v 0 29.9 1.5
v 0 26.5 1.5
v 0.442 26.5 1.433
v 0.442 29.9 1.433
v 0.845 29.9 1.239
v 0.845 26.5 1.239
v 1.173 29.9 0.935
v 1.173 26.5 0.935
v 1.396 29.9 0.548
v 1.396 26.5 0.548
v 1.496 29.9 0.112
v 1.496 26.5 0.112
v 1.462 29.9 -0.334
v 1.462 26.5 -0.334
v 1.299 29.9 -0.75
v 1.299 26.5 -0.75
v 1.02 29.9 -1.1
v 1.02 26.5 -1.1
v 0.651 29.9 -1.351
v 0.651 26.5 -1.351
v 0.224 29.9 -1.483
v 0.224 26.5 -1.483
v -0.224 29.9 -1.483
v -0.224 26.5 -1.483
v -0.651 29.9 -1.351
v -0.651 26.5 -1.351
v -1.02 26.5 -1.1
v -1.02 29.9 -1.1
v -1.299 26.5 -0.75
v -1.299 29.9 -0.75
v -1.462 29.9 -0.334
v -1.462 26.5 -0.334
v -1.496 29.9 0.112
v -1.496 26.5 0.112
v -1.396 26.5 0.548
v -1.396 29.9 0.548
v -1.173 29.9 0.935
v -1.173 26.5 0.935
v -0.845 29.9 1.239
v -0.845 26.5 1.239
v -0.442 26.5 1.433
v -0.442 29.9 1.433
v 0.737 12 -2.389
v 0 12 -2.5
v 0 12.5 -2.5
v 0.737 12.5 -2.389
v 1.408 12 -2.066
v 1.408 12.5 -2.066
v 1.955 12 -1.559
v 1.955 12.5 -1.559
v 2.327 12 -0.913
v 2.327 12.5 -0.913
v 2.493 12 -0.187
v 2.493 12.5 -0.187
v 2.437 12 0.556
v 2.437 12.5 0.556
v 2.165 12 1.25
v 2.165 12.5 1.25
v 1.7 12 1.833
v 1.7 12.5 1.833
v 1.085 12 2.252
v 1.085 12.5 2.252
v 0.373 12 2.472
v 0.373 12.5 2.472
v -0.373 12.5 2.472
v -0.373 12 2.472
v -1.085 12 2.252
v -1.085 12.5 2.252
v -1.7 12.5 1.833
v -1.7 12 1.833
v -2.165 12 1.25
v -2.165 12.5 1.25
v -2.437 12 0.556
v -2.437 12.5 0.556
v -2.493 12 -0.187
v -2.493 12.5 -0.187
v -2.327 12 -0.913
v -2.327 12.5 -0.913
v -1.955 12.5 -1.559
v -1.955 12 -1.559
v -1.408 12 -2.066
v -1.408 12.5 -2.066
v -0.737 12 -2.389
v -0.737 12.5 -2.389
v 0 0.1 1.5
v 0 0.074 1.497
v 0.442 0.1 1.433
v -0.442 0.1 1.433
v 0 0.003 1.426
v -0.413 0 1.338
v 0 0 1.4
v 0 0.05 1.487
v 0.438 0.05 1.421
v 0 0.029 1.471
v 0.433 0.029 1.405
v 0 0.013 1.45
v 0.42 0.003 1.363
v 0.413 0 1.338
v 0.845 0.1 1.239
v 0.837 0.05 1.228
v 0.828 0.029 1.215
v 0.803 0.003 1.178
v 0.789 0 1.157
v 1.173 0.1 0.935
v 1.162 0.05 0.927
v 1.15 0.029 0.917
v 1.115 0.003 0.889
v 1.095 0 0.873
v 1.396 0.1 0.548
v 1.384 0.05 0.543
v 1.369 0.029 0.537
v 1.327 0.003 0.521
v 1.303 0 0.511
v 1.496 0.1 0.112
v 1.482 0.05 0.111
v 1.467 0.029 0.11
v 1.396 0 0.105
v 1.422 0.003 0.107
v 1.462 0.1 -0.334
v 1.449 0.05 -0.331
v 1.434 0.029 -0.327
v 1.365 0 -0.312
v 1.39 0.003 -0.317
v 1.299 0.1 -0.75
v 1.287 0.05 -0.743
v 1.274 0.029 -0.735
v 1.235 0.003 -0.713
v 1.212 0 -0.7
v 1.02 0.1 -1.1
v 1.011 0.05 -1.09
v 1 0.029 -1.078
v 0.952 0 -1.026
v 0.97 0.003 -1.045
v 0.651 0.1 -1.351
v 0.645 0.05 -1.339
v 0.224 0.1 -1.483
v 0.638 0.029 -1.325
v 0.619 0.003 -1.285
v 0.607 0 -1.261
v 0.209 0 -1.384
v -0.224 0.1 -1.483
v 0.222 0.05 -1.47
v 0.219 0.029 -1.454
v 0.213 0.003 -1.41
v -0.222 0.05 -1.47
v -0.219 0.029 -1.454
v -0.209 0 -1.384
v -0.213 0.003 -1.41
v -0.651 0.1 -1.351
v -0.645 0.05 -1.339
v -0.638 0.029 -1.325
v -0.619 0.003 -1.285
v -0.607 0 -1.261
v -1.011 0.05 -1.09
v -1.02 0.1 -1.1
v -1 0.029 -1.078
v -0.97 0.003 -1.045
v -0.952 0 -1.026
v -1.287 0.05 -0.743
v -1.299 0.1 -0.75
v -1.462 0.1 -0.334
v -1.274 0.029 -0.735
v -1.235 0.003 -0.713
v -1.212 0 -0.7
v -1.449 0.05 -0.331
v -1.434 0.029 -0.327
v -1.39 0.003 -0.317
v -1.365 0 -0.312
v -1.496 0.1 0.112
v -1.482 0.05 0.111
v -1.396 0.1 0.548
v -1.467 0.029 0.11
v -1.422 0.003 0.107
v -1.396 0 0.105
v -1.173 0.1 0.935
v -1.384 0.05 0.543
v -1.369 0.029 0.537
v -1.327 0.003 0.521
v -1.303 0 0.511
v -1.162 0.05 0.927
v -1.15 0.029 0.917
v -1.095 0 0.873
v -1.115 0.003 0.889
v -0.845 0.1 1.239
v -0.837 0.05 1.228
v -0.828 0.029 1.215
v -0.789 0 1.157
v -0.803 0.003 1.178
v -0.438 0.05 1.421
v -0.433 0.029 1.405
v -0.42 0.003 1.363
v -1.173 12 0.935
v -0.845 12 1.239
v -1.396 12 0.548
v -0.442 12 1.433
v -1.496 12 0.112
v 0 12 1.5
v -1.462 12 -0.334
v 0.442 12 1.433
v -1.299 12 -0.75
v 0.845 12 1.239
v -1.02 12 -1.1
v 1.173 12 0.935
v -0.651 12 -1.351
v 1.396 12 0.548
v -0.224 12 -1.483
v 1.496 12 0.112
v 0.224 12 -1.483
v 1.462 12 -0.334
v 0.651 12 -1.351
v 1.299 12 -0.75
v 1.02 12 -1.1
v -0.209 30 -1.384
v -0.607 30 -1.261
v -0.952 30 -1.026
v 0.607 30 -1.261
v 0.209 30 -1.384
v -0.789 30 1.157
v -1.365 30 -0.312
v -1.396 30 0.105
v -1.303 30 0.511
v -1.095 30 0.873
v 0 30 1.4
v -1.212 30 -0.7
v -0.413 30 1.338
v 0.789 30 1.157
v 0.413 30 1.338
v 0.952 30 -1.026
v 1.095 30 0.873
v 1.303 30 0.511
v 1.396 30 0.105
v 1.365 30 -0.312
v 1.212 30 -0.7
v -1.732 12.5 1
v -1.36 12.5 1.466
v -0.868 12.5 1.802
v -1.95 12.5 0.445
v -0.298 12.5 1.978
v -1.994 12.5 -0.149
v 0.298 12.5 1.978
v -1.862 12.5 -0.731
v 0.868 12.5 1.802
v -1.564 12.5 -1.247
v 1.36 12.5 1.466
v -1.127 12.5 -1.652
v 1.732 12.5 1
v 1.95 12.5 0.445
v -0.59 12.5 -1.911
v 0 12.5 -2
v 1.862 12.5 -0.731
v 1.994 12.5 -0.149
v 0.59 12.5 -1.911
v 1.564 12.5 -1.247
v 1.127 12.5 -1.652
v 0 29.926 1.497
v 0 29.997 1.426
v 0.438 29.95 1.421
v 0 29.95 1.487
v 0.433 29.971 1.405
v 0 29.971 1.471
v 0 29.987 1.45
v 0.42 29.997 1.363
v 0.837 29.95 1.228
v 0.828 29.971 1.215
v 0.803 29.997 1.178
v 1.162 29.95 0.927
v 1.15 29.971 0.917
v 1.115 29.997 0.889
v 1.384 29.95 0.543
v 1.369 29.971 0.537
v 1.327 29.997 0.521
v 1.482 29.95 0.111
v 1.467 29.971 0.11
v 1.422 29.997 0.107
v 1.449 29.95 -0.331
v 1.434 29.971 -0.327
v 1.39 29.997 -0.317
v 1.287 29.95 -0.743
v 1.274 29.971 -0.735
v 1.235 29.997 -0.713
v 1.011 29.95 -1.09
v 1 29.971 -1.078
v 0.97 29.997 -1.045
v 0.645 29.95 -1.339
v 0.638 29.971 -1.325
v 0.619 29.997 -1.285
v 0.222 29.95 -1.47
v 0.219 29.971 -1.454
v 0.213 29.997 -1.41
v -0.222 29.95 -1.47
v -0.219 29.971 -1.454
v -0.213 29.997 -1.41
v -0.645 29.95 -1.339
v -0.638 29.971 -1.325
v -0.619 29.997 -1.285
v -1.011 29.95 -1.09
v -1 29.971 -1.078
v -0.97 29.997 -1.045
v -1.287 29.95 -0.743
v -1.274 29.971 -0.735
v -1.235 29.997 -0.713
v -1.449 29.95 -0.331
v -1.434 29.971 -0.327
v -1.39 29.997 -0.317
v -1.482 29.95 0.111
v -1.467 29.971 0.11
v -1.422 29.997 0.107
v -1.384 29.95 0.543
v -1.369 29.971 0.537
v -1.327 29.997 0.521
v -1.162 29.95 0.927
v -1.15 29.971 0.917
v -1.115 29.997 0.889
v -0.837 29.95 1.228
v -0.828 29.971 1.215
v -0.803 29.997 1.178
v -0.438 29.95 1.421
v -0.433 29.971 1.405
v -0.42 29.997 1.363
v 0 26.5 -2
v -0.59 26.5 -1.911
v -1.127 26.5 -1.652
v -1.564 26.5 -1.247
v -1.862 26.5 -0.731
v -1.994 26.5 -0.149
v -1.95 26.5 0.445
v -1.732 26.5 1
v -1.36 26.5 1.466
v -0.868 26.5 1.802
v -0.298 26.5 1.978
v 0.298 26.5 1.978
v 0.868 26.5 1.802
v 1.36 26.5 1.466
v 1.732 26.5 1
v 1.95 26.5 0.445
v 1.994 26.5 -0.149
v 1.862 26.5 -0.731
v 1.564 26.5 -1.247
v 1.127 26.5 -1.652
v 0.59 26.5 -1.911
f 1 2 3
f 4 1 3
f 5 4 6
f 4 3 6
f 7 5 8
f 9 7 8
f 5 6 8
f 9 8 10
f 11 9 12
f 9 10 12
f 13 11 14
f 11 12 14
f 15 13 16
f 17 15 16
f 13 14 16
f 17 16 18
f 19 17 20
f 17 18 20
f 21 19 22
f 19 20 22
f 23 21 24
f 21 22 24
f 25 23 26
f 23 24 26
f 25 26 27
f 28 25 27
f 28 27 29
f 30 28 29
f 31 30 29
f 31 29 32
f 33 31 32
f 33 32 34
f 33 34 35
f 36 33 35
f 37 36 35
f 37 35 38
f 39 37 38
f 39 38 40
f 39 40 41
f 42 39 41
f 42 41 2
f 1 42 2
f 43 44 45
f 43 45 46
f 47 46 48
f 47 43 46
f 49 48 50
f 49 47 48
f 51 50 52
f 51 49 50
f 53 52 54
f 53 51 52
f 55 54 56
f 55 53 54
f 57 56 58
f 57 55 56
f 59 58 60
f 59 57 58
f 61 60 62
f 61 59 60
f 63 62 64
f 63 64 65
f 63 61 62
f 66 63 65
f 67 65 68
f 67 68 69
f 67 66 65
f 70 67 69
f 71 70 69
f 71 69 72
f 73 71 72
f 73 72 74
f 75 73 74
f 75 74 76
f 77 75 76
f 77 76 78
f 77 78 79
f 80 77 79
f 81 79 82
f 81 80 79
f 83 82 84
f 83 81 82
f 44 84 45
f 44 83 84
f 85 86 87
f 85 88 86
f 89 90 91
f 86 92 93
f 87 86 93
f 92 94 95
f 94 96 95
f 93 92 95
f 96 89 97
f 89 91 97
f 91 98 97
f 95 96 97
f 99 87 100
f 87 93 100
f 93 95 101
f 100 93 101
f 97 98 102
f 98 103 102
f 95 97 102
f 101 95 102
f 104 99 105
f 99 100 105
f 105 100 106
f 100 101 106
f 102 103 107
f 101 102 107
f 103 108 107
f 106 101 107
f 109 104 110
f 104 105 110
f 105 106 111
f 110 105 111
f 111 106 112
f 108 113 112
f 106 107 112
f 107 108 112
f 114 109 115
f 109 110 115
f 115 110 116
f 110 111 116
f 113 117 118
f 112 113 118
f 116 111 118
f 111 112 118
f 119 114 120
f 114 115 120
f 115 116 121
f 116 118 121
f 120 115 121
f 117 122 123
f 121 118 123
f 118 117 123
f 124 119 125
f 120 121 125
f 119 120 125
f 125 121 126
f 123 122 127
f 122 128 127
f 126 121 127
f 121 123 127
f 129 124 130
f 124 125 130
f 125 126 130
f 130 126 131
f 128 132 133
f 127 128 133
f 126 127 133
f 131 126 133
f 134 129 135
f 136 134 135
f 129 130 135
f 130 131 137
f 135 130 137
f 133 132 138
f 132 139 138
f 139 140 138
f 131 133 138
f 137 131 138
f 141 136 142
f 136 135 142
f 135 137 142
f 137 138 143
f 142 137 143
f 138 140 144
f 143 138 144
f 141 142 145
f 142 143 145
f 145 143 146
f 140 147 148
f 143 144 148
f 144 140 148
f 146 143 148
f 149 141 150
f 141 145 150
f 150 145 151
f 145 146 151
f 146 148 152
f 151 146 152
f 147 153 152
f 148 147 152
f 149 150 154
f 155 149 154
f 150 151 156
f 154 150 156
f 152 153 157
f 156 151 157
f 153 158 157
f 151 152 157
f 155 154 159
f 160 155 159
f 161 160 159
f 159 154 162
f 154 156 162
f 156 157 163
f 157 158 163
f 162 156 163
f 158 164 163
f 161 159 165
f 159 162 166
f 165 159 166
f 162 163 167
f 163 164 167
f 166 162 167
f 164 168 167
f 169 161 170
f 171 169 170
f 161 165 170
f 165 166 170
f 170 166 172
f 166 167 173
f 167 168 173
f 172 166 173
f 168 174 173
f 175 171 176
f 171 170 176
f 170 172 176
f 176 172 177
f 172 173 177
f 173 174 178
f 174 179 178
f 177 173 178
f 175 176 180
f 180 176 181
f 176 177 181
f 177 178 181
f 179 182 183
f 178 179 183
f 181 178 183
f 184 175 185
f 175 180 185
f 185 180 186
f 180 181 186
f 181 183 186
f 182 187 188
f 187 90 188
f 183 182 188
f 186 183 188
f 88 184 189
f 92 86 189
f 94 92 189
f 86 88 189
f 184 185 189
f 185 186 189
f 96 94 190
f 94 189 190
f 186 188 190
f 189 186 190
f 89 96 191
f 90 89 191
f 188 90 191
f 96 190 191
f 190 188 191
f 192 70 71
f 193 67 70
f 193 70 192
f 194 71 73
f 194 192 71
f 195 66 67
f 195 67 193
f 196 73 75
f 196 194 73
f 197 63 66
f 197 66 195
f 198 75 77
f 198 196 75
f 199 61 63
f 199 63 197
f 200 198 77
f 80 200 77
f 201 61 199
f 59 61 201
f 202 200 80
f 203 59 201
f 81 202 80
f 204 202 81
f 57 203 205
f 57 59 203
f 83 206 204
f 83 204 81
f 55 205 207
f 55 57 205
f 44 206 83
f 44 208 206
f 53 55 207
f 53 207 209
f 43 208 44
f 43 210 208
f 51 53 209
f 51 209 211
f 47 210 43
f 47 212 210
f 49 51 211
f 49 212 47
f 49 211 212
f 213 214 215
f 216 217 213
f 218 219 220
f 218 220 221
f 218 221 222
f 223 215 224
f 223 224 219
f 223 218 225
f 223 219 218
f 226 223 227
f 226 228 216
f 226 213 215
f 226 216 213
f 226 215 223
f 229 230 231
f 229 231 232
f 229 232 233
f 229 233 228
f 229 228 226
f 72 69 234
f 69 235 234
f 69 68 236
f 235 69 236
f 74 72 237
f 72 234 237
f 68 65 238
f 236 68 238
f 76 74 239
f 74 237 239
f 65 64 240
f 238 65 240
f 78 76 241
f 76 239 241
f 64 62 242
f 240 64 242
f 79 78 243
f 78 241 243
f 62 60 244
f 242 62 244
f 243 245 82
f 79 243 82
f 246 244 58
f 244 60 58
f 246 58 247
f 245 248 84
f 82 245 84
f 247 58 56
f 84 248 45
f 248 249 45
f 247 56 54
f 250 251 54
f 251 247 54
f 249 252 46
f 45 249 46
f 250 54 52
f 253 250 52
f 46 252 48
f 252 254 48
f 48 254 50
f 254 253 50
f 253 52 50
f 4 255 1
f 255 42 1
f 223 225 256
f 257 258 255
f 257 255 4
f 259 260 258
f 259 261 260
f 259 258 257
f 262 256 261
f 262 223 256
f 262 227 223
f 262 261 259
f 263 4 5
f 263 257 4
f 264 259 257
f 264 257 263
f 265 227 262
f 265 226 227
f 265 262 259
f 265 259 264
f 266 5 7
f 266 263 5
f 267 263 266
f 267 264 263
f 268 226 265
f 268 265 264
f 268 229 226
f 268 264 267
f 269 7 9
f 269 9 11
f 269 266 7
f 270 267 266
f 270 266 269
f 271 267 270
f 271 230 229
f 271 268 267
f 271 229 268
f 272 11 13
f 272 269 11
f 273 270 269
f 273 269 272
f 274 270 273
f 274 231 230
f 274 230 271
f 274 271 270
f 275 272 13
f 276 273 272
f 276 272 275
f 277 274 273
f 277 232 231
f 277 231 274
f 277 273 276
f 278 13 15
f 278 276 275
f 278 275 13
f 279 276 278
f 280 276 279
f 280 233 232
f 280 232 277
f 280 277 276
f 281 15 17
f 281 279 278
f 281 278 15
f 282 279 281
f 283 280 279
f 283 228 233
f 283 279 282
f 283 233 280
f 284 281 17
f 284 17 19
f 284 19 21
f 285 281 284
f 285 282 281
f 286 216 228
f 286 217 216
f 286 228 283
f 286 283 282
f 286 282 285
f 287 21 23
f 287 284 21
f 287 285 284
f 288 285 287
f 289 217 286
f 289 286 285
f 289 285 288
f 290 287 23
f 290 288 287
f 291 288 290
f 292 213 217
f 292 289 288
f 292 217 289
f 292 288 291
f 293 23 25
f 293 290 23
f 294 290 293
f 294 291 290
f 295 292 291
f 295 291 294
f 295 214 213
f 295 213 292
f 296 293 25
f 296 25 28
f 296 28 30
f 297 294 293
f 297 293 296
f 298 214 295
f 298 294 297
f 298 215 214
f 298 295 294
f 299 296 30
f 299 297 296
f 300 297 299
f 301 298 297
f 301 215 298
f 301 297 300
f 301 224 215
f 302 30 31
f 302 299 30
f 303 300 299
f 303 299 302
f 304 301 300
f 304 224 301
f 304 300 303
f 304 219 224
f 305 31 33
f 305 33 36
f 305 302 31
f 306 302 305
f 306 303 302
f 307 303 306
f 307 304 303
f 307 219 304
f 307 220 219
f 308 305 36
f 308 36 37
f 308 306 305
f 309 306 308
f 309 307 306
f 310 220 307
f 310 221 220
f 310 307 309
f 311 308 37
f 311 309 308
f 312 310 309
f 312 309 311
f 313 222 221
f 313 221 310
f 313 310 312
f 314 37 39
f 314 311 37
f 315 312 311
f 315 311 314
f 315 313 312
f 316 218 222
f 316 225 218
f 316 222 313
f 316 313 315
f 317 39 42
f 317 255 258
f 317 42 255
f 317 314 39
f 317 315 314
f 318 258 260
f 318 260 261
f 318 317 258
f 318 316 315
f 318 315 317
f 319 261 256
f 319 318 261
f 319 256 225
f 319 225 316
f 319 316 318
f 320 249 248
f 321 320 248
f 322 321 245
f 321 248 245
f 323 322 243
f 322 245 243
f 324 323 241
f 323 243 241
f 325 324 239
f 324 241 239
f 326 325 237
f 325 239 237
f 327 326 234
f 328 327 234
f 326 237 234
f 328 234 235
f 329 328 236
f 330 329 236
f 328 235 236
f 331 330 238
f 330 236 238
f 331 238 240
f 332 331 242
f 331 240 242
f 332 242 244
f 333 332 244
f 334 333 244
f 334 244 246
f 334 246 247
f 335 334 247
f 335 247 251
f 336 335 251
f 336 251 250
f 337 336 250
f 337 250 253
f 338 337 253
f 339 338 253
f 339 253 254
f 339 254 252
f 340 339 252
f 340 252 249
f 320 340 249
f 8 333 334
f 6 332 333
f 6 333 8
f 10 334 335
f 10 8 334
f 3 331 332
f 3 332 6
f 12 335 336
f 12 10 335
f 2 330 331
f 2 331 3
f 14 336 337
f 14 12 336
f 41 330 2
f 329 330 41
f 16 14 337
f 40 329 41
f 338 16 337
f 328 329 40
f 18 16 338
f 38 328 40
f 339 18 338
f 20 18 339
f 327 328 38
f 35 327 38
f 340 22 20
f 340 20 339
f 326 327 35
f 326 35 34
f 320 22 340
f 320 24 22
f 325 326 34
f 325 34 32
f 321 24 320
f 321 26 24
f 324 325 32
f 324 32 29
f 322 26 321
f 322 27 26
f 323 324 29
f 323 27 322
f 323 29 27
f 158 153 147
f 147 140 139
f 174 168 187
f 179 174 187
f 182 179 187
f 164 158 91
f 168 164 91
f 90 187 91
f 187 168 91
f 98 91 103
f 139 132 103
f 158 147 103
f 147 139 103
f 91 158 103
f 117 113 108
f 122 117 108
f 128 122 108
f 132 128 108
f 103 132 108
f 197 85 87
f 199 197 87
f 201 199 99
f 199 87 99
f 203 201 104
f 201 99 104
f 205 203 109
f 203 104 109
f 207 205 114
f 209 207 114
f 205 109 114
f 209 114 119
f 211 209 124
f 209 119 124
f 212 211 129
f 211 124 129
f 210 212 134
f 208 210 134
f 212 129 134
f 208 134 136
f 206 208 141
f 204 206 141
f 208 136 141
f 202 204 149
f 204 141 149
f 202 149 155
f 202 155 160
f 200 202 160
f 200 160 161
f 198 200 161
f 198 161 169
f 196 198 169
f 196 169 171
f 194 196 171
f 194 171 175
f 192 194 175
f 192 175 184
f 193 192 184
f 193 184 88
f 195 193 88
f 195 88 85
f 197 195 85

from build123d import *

# Parameters (mm, degrees)
SKETCH_1_R      = 1.5
EXTRUDE_1_DEPTH = 30
SKETCH_2_R      = 2
SKETCH_2_R_2    = 1.5
EXTRUDE_2_DEPTH = 14.5
FILLET_1_R      = 0.1
SKETCH_3_R      = 2.5
SKETCH_3_R_2    = 2
EXTRUDE_3_DEPTH = 0.5


with BuildPart() as part:
    # 草图1 → 凸台-拉伸1 (new body)
    with BuildSketch(Plane(origin=(0, 0, 0), x_dir=(1, 0, 0), z_dir=(0, 1, 0))):
        with Locations(Location((0, 0, 0), (0, 0, 270))):
            Circle(SKETCH_1_R)
    extrude(amount=EXTRUDE_1_DEPTH)

    # 草图2 → 凸台-拉伸2 (add)
    with BuildSketch(Plane(origin=(0, 12, 0), x_dir=(1, 0, 0), z_dir=(0, 1, 0))):
        with Locations(Location((0, 0, 0), (0, 0, 90))):
            Circle(SKETCH_2_R)
        with Locations(Location((0, 0, 0), (0, 0, 270))):
            Circle(SKETCH_2_R_2, mode=Mode.SUBTRACT)
    extrude(amount=EXTRUDE_2_DEPTH)

    # 圆角1
    fillet_1_edges = [part.edges().sort_by_distance(p)[0] for p in [
        (0, 0, -1.5),
        (0, 30, -1.5),
    ]]
    fillet(fillet_1_edges, radius=FILLET_1_R)

    # 草图3 → 凸台-拉伸3 (add)
    with BuildSketch(Plane(origin=(0, 12, 0), x_dir=(-1, 0, 0), z_dir=(0, -1, 0))):
        with Locations(Location((0, 0, 0), (0, 0, 90))):
            Circle(SKETCH_3_R)
        with Locations(Location((0, 0, 0), (0, 0, 90))):
            Circle(SKETCH_3_R_2, mode=Mode.SUBTRACT)
    extrude(amount=-EXTRUDE_3_DEPTH)


solid = part.part
